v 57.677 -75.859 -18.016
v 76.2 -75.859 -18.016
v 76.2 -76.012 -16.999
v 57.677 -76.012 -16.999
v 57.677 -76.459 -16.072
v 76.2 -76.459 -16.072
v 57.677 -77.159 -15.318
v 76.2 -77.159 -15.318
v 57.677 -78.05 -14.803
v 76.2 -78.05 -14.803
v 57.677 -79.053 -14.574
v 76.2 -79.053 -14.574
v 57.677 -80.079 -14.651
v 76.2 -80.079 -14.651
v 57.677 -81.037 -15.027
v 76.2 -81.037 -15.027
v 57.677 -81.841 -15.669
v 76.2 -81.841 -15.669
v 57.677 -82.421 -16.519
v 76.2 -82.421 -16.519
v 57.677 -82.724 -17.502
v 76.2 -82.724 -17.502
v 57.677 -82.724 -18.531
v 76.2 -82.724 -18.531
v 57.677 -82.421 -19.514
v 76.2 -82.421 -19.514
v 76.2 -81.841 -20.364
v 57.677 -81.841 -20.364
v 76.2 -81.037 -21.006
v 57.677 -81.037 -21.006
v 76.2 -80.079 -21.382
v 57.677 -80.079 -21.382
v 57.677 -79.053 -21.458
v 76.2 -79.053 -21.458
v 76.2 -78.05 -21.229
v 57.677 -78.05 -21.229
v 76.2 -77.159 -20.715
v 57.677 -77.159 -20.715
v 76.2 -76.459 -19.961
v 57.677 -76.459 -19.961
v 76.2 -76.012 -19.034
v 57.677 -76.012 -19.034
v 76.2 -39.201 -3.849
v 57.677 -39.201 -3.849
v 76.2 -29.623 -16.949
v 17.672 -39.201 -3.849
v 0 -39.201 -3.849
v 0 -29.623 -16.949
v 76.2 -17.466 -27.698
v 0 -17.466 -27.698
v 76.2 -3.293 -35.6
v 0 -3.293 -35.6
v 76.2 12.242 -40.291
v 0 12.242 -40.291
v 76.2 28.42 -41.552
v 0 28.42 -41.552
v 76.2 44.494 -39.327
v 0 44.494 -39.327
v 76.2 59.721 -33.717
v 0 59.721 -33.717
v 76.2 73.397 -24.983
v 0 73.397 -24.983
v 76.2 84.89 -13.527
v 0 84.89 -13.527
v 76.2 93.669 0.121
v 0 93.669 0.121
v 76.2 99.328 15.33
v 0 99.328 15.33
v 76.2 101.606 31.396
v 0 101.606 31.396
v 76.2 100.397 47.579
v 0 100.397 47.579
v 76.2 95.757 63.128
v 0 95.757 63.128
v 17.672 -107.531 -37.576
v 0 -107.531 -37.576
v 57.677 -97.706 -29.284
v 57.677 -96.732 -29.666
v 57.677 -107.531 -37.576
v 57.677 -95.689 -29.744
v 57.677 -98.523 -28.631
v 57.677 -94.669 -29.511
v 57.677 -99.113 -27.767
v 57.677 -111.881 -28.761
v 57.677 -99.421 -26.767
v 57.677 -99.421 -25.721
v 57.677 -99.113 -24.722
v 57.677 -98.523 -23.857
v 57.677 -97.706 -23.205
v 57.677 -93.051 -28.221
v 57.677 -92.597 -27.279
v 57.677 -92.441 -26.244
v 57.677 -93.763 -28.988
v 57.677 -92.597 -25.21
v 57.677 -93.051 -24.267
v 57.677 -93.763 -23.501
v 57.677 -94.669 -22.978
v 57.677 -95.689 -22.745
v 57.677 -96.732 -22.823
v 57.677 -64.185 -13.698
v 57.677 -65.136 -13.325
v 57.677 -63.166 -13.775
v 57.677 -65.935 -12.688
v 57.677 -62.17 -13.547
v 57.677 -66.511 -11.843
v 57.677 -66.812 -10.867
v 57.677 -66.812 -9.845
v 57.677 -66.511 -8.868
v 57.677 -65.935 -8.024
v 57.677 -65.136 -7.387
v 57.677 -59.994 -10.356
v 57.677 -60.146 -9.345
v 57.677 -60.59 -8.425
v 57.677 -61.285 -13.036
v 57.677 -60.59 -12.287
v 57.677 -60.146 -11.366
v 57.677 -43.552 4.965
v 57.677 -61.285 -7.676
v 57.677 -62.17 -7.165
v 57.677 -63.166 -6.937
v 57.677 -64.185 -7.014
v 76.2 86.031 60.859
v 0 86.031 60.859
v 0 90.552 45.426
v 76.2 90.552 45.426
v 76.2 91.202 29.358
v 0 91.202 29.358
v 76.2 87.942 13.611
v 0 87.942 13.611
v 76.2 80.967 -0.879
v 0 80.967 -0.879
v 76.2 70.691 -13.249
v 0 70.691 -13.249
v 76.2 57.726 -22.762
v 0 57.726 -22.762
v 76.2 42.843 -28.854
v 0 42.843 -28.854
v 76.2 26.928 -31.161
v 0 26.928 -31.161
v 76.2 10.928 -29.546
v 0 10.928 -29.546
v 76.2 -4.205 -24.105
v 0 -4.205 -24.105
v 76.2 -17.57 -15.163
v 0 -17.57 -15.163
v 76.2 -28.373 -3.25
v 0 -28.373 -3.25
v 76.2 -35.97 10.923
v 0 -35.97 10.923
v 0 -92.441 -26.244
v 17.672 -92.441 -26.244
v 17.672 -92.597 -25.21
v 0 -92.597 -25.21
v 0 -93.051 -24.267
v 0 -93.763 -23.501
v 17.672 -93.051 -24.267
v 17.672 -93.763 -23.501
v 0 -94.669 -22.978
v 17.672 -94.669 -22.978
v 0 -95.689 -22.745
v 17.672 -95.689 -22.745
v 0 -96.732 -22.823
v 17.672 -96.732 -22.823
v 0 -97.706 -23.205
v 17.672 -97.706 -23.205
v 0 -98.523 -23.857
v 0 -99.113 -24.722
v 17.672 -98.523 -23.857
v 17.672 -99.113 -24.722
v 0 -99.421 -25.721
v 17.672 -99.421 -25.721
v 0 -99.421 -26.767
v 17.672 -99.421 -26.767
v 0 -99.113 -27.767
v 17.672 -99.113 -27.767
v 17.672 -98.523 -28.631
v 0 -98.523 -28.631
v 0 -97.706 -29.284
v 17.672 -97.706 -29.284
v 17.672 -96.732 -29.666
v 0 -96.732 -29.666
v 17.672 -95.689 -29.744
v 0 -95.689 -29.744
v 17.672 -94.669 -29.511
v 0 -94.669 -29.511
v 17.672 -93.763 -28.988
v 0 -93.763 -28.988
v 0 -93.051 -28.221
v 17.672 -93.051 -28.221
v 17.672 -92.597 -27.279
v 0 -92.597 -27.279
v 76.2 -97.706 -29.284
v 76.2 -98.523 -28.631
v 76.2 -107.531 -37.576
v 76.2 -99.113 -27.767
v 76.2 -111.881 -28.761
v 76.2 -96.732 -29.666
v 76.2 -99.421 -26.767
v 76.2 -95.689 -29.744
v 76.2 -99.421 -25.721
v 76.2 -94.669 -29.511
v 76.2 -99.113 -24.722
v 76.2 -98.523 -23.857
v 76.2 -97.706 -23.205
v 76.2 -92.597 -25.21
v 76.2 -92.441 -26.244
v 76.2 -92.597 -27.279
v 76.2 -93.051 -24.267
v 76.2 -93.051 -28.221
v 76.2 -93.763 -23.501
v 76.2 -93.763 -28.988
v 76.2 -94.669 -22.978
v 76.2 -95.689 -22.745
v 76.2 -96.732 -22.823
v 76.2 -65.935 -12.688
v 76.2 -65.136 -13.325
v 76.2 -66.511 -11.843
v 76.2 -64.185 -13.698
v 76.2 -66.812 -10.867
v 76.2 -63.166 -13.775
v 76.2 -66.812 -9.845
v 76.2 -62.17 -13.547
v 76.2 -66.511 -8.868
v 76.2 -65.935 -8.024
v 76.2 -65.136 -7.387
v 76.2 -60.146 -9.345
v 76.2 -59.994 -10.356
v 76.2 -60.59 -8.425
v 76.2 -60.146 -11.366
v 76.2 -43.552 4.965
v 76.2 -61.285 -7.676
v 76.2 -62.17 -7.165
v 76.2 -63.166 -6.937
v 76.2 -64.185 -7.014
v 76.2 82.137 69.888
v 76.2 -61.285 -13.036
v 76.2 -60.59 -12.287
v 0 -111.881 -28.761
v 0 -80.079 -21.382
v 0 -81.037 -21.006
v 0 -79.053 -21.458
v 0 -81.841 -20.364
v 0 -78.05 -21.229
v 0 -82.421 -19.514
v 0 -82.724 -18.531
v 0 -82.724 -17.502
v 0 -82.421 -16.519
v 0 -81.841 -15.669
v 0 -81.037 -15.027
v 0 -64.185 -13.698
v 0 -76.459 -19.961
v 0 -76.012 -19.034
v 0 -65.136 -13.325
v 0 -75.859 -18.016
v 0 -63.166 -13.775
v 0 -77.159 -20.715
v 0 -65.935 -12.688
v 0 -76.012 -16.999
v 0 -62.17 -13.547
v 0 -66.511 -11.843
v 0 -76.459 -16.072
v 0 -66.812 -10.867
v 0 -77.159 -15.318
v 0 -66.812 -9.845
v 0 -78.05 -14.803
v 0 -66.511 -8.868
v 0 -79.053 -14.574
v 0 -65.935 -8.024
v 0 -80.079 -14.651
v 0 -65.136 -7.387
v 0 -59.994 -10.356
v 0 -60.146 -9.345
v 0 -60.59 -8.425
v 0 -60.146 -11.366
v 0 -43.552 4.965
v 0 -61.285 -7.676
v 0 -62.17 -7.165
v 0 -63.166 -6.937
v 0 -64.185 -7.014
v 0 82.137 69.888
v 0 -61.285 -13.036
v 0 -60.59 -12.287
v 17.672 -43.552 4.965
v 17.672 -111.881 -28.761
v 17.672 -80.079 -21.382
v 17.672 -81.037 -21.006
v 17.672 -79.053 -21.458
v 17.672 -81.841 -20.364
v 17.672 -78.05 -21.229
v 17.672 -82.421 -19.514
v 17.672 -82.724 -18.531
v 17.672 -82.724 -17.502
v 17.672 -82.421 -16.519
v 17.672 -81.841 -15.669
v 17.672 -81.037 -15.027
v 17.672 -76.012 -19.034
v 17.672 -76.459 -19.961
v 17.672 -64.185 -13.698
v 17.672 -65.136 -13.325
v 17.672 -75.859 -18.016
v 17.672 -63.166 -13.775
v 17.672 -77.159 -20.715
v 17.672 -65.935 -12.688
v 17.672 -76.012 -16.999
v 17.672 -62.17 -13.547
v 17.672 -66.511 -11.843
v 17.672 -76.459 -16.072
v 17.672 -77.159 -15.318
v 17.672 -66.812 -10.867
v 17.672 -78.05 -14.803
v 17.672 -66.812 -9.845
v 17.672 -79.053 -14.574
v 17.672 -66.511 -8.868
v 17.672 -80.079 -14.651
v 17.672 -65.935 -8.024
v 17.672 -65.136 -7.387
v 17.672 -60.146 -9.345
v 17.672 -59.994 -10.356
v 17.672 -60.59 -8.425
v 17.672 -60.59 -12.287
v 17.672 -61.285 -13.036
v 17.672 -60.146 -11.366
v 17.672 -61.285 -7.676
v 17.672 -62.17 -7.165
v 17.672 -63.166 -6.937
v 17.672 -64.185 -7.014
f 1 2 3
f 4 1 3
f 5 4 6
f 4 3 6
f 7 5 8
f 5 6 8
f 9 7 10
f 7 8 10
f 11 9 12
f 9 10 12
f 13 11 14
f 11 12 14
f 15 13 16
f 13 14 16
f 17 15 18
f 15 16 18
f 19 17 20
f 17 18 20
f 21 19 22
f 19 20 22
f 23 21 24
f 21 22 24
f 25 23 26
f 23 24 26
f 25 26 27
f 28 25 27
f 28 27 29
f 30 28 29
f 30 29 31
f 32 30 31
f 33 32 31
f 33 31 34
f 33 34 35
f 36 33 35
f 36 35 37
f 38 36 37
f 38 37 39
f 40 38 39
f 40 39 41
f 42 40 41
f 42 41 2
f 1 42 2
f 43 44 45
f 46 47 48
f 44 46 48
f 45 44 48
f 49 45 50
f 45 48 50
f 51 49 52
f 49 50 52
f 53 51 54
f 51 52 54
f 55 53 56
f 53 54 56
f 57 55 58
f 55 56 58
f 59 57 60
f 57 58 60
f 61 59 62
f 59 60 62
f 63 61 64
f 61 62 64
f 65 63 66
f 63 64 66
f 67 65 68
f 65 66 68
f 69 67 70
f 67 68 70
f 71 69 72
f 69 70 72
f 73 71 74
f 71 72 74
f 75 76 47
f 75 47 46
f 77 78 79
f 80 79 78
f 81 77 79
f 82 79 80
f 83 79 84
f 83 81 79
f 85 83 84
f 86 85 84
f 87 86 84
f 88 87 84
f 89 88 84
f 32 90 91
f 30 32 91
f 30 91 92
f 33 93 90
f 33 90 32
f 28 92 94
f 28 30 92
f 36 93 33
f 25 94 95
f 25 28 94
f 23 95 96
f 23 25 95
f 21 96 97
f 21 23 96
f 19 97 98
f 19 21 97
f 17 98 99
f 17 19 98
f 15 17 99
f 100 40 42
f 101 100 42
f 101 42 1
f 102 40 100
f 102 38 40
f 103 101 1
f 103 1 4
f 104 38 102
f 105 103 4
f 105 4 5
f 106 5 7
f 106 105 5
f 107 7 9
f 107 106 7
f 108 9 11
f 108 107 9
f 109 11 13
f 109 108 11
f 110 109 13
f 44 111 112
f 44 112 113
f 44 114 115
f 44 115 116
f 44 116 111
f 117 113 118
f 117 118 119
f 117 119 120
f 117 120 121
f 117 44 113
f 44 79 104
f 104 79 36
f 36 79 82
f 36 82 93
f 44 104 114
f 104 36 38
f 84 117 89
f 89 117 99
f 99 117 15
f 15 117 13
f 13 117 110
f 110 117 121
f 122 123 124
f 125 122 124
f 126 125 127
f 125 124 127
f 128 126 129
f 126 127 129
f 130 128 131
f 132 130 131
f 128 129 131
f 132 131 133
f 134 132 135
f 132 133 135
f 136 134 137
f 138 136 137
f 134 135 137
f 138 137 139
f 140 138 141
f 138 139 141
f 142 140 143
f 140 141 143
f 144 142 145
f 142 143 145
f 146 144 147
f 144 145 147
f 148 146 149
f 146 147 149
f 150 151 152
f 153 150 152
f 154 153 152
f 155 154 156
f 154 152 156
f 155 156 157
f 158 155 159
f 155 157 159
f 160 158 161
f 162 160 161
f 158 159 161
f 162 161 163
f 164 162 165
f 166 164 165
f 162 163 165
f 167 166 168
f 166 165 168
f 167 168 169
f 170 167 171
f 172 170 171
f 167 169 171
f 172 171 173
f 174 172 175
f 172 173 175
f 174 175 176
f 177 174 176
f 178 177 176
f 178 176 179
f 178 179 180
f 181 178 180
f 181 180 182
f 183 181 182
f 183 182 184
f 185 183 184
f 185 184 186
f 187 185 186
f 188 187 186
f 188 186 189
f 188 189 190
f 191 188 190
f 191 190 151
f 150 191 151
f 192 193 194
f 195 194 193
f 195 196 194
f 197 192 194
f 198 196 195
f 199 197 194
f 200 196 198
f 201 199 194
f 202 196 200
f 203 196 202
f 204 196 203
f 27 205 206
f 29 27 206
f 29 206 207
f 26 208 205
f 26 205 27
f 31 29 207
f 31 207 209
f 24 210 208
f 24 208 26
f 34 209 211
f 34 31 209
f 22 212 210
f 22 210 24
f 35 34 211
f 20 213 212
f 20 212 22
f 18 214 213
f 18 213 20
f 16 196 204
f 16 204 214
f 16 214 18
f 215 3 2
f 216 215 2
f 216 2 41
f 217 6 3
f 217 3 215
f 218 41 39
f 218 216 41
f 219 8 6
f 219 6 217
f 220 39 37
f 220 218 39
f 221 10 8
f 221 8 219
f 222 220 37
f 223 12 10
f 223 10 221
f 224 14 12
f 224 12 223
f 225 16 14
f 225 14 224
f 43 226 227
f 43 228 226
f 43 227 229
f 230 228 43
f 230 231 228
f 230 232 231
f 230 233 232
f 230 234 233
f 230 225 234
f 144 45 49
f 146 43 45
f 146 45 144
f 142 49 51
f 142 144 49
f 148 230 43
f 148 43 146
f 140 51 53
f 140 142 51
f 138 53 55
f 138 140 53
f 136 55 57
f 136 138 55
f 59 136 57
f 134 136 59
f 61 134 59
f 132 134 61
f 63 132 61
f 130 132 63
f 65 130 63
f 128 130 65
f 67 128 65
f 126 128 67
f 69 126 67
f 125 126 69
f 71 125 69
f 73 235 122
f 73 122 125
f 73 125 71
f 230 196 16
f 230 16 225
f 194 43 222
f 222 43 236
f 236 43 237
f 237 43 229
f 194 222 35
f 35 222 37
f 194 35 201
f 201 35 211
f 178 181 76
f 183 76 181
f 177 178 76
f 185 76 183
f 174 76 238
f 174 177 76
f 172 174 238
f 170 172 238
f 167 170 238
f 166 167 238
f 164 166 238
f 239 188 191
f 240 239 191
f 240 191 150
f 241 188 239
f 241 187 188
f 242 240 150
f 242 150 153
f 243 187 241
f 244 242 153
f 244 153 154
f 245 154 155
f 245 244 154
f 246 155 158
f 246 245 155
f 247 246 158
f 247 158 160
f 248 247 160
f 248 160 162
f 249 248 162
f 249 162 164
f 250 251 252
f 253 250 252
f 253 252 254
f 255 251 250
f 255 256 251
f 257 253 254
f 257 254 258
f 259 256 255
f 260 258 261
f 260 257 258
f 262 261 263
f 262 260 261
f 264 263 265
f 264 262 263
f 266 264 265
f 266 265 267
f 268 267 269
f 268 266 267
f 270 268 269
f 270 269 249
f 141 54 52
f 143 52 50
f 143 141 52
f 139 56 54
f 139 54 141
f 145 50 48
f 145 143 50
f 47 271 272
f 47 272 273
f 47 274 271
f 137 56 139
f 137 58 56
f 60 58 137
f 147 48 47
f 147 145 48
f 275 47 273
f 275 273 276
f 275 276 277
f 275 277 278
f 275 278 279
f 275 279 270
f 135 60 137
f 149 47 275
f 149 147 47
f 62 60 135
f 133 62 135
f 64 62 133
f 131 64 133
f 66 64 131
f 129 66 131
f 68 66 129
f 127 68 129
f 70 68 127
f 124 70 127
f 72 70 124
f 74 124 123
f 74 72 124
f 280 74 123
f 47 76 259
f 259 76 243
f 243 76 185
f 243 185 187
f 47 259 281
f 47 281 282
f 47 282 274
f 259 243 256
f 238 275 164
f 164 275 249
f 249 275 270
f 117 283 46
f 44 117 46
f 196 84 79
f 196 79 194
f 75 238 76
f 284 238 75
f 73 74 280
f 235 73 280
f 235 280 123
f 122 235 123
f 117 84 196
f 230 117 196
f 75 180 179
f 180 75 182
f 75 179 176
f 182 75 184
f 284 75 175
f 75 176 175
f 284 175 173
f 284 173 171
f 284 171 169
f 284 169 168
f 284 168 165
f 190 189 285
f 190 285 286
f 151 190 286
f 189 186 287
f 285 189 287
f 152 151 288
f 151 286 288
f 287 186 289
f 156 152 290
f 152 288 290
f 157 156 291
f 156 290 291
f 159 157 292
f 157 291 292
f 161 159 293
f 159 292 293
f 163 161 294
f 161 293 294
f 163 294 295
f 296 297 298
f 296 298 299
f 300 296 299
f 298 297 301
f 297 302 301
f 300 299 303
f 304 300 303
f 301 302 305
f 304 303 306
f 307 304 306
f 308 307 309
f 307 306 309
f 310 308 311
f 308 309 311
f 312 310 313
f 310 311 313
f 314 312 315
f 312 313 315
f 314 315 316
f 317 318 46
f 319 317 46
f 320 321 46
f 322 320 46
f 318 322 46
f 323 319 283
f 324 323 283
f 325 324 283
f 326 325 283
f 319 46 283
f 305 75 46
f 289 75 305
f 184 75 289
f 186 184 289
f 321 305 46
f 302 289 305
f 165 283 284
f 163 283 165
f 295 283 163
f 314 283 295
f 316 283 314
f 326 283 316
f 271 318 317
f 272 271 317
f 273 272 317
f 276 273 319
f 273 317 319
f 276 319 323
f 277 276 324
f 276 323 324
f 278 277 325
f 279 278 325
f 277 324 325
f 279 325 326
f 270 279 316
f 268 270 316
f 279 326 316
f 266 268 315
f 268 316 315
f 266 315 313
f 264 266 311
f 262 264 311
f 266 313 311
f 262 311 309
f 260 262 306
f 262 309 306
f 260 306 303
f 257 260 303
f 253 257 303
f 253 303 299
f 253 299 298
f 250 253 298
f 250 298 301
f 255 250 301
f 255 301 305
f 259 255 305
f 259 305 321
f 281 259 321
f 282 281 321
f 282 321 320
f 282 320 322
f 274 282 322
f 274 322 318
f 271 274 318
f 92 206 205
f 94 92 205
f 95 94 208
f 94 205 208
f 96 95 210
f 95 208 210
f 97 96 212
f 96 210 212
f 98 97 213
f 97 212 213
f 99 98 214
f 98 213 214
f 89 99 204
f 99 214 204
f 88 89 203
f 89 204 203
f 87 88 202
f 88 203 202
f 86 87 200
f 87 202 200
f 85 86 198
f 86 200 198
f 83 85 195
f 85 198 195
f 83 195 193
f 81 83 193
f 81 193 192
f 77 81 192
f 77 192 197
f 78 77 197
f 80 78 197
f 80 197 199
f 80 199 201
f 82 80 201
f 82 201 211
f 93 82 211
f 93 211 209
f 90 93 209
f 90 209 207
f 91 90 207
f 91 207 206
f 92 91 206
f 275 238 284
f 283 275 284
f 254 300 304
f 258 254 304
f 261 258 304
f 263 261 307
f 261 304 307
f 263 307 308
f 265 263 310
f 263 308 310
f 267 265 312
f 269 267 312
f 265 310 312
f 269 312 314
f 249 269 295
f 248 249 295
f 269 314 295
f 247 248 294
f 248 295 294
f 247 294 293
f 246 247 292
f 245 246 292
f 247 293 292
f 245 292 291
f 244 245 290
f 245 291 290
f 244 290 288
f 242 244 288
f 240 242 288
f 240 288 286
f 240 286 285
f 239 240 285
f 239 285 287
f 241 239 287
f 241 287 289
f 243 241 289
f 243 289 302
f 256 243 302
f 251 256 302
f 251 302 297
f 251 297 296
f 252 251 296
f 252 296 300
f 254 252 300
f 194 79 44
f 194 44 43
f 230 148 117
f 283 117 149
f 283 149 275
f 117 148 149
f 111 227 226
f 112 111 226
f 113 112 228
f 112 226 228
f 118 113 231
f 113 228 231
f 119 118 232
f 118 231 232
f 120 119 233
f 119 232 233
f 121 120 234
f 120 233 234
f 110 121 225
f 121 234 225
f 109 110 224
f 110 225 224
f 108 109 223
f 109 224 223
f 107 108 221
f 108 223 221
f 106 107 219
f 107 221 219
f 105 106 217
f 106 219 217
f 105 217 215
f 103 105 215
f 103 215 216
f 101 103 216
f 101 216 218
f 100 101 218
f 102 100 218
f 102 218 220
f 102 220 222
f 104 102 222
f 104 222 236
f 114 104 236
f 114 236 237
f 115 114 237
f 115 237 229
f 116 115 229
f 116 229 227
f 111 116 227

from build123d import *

# Parameters (mm, degrees)
F1_DEPTH = 76.2
F2_W     = 17.6722221076
F2_H     = 9.8298916579
F2_W_2   = 18.5227831721
F3_DEPTH = 76.2
F4_R     = 3.4516477469
F4_R_2   = 3.5094678627
F5_DEPTH = 127
F6_R     = 3.428244009
F7_DEPTH = 127


with BuildPart() as f1:
    # F0 (on Right) → F1 (new body)
    with BuildSketch(Plane.YZ):
        with BuildLine():
            Line((-43.5515455902, 4.9651595764), (-39.2007894463, -3.8494697966))
            ThreePointArc((-39.2007894463, -3.8494697966), (59.7212641248, -33.7173735079), (95.7566574216, 63.1284564734))
            Line((95.7566574216, 63.1284564734), (82.136558344, 69.8877791238))
            Line((82.136558344, 69.8877791238), (86.031280458, 60.8586706221))
            ThreePointArc((86.031280458, 60.8586706221), (50.4707031722, -26.2634284737), (-35.969786346, 10.9233511612))
            Line((-35.969786346, 10.9233511612), (-43.5515455902, 4.9651595764))
        make_face()
    extrude(amount=F1_DEPTH)

    # F2 (on face) → F3 (join)
    with BuildSketch(Plane(origin=(0, -33.0492176978, -16.3125505187), x_dir=(1, 0, 0), z_dir=(0, -0.8967168388, -0.4426046894))):
        with Locations((8.8361110538, 18.8135146783)):
            Rectangle(F2_W, F2_H)
        with Locations((66.9386084139, 18.8135146783)):
            Rectangle(F2_W_2, F2_H)
    extrude(amount=F3_DEPTH)

    # F4 (on face) → F5 (cut)
    with BuildSketch(Plane.YZ.offset(76.2)):
        with Locations((-79.3107077479, -18.0164370686)):
            Circle(F4_R)
        with Locations((-95.9507897496, -26.2444168329)):
            Circle(F4_R_2)
    extrude(amount=-F5_DEPTH, mode=Mode.SUBTRACT)

    # F6 (on face) → F7 (cut)
    with BuildSketch(Plane.YZ.offset(76.2)):
        with Locations((-63.4221956134, -10.355903767)):
            Circle(F6_R)
    extrude(amount=-F7_DEPTH, mode=Mode.SUBTRACT)


solid = f1.part
